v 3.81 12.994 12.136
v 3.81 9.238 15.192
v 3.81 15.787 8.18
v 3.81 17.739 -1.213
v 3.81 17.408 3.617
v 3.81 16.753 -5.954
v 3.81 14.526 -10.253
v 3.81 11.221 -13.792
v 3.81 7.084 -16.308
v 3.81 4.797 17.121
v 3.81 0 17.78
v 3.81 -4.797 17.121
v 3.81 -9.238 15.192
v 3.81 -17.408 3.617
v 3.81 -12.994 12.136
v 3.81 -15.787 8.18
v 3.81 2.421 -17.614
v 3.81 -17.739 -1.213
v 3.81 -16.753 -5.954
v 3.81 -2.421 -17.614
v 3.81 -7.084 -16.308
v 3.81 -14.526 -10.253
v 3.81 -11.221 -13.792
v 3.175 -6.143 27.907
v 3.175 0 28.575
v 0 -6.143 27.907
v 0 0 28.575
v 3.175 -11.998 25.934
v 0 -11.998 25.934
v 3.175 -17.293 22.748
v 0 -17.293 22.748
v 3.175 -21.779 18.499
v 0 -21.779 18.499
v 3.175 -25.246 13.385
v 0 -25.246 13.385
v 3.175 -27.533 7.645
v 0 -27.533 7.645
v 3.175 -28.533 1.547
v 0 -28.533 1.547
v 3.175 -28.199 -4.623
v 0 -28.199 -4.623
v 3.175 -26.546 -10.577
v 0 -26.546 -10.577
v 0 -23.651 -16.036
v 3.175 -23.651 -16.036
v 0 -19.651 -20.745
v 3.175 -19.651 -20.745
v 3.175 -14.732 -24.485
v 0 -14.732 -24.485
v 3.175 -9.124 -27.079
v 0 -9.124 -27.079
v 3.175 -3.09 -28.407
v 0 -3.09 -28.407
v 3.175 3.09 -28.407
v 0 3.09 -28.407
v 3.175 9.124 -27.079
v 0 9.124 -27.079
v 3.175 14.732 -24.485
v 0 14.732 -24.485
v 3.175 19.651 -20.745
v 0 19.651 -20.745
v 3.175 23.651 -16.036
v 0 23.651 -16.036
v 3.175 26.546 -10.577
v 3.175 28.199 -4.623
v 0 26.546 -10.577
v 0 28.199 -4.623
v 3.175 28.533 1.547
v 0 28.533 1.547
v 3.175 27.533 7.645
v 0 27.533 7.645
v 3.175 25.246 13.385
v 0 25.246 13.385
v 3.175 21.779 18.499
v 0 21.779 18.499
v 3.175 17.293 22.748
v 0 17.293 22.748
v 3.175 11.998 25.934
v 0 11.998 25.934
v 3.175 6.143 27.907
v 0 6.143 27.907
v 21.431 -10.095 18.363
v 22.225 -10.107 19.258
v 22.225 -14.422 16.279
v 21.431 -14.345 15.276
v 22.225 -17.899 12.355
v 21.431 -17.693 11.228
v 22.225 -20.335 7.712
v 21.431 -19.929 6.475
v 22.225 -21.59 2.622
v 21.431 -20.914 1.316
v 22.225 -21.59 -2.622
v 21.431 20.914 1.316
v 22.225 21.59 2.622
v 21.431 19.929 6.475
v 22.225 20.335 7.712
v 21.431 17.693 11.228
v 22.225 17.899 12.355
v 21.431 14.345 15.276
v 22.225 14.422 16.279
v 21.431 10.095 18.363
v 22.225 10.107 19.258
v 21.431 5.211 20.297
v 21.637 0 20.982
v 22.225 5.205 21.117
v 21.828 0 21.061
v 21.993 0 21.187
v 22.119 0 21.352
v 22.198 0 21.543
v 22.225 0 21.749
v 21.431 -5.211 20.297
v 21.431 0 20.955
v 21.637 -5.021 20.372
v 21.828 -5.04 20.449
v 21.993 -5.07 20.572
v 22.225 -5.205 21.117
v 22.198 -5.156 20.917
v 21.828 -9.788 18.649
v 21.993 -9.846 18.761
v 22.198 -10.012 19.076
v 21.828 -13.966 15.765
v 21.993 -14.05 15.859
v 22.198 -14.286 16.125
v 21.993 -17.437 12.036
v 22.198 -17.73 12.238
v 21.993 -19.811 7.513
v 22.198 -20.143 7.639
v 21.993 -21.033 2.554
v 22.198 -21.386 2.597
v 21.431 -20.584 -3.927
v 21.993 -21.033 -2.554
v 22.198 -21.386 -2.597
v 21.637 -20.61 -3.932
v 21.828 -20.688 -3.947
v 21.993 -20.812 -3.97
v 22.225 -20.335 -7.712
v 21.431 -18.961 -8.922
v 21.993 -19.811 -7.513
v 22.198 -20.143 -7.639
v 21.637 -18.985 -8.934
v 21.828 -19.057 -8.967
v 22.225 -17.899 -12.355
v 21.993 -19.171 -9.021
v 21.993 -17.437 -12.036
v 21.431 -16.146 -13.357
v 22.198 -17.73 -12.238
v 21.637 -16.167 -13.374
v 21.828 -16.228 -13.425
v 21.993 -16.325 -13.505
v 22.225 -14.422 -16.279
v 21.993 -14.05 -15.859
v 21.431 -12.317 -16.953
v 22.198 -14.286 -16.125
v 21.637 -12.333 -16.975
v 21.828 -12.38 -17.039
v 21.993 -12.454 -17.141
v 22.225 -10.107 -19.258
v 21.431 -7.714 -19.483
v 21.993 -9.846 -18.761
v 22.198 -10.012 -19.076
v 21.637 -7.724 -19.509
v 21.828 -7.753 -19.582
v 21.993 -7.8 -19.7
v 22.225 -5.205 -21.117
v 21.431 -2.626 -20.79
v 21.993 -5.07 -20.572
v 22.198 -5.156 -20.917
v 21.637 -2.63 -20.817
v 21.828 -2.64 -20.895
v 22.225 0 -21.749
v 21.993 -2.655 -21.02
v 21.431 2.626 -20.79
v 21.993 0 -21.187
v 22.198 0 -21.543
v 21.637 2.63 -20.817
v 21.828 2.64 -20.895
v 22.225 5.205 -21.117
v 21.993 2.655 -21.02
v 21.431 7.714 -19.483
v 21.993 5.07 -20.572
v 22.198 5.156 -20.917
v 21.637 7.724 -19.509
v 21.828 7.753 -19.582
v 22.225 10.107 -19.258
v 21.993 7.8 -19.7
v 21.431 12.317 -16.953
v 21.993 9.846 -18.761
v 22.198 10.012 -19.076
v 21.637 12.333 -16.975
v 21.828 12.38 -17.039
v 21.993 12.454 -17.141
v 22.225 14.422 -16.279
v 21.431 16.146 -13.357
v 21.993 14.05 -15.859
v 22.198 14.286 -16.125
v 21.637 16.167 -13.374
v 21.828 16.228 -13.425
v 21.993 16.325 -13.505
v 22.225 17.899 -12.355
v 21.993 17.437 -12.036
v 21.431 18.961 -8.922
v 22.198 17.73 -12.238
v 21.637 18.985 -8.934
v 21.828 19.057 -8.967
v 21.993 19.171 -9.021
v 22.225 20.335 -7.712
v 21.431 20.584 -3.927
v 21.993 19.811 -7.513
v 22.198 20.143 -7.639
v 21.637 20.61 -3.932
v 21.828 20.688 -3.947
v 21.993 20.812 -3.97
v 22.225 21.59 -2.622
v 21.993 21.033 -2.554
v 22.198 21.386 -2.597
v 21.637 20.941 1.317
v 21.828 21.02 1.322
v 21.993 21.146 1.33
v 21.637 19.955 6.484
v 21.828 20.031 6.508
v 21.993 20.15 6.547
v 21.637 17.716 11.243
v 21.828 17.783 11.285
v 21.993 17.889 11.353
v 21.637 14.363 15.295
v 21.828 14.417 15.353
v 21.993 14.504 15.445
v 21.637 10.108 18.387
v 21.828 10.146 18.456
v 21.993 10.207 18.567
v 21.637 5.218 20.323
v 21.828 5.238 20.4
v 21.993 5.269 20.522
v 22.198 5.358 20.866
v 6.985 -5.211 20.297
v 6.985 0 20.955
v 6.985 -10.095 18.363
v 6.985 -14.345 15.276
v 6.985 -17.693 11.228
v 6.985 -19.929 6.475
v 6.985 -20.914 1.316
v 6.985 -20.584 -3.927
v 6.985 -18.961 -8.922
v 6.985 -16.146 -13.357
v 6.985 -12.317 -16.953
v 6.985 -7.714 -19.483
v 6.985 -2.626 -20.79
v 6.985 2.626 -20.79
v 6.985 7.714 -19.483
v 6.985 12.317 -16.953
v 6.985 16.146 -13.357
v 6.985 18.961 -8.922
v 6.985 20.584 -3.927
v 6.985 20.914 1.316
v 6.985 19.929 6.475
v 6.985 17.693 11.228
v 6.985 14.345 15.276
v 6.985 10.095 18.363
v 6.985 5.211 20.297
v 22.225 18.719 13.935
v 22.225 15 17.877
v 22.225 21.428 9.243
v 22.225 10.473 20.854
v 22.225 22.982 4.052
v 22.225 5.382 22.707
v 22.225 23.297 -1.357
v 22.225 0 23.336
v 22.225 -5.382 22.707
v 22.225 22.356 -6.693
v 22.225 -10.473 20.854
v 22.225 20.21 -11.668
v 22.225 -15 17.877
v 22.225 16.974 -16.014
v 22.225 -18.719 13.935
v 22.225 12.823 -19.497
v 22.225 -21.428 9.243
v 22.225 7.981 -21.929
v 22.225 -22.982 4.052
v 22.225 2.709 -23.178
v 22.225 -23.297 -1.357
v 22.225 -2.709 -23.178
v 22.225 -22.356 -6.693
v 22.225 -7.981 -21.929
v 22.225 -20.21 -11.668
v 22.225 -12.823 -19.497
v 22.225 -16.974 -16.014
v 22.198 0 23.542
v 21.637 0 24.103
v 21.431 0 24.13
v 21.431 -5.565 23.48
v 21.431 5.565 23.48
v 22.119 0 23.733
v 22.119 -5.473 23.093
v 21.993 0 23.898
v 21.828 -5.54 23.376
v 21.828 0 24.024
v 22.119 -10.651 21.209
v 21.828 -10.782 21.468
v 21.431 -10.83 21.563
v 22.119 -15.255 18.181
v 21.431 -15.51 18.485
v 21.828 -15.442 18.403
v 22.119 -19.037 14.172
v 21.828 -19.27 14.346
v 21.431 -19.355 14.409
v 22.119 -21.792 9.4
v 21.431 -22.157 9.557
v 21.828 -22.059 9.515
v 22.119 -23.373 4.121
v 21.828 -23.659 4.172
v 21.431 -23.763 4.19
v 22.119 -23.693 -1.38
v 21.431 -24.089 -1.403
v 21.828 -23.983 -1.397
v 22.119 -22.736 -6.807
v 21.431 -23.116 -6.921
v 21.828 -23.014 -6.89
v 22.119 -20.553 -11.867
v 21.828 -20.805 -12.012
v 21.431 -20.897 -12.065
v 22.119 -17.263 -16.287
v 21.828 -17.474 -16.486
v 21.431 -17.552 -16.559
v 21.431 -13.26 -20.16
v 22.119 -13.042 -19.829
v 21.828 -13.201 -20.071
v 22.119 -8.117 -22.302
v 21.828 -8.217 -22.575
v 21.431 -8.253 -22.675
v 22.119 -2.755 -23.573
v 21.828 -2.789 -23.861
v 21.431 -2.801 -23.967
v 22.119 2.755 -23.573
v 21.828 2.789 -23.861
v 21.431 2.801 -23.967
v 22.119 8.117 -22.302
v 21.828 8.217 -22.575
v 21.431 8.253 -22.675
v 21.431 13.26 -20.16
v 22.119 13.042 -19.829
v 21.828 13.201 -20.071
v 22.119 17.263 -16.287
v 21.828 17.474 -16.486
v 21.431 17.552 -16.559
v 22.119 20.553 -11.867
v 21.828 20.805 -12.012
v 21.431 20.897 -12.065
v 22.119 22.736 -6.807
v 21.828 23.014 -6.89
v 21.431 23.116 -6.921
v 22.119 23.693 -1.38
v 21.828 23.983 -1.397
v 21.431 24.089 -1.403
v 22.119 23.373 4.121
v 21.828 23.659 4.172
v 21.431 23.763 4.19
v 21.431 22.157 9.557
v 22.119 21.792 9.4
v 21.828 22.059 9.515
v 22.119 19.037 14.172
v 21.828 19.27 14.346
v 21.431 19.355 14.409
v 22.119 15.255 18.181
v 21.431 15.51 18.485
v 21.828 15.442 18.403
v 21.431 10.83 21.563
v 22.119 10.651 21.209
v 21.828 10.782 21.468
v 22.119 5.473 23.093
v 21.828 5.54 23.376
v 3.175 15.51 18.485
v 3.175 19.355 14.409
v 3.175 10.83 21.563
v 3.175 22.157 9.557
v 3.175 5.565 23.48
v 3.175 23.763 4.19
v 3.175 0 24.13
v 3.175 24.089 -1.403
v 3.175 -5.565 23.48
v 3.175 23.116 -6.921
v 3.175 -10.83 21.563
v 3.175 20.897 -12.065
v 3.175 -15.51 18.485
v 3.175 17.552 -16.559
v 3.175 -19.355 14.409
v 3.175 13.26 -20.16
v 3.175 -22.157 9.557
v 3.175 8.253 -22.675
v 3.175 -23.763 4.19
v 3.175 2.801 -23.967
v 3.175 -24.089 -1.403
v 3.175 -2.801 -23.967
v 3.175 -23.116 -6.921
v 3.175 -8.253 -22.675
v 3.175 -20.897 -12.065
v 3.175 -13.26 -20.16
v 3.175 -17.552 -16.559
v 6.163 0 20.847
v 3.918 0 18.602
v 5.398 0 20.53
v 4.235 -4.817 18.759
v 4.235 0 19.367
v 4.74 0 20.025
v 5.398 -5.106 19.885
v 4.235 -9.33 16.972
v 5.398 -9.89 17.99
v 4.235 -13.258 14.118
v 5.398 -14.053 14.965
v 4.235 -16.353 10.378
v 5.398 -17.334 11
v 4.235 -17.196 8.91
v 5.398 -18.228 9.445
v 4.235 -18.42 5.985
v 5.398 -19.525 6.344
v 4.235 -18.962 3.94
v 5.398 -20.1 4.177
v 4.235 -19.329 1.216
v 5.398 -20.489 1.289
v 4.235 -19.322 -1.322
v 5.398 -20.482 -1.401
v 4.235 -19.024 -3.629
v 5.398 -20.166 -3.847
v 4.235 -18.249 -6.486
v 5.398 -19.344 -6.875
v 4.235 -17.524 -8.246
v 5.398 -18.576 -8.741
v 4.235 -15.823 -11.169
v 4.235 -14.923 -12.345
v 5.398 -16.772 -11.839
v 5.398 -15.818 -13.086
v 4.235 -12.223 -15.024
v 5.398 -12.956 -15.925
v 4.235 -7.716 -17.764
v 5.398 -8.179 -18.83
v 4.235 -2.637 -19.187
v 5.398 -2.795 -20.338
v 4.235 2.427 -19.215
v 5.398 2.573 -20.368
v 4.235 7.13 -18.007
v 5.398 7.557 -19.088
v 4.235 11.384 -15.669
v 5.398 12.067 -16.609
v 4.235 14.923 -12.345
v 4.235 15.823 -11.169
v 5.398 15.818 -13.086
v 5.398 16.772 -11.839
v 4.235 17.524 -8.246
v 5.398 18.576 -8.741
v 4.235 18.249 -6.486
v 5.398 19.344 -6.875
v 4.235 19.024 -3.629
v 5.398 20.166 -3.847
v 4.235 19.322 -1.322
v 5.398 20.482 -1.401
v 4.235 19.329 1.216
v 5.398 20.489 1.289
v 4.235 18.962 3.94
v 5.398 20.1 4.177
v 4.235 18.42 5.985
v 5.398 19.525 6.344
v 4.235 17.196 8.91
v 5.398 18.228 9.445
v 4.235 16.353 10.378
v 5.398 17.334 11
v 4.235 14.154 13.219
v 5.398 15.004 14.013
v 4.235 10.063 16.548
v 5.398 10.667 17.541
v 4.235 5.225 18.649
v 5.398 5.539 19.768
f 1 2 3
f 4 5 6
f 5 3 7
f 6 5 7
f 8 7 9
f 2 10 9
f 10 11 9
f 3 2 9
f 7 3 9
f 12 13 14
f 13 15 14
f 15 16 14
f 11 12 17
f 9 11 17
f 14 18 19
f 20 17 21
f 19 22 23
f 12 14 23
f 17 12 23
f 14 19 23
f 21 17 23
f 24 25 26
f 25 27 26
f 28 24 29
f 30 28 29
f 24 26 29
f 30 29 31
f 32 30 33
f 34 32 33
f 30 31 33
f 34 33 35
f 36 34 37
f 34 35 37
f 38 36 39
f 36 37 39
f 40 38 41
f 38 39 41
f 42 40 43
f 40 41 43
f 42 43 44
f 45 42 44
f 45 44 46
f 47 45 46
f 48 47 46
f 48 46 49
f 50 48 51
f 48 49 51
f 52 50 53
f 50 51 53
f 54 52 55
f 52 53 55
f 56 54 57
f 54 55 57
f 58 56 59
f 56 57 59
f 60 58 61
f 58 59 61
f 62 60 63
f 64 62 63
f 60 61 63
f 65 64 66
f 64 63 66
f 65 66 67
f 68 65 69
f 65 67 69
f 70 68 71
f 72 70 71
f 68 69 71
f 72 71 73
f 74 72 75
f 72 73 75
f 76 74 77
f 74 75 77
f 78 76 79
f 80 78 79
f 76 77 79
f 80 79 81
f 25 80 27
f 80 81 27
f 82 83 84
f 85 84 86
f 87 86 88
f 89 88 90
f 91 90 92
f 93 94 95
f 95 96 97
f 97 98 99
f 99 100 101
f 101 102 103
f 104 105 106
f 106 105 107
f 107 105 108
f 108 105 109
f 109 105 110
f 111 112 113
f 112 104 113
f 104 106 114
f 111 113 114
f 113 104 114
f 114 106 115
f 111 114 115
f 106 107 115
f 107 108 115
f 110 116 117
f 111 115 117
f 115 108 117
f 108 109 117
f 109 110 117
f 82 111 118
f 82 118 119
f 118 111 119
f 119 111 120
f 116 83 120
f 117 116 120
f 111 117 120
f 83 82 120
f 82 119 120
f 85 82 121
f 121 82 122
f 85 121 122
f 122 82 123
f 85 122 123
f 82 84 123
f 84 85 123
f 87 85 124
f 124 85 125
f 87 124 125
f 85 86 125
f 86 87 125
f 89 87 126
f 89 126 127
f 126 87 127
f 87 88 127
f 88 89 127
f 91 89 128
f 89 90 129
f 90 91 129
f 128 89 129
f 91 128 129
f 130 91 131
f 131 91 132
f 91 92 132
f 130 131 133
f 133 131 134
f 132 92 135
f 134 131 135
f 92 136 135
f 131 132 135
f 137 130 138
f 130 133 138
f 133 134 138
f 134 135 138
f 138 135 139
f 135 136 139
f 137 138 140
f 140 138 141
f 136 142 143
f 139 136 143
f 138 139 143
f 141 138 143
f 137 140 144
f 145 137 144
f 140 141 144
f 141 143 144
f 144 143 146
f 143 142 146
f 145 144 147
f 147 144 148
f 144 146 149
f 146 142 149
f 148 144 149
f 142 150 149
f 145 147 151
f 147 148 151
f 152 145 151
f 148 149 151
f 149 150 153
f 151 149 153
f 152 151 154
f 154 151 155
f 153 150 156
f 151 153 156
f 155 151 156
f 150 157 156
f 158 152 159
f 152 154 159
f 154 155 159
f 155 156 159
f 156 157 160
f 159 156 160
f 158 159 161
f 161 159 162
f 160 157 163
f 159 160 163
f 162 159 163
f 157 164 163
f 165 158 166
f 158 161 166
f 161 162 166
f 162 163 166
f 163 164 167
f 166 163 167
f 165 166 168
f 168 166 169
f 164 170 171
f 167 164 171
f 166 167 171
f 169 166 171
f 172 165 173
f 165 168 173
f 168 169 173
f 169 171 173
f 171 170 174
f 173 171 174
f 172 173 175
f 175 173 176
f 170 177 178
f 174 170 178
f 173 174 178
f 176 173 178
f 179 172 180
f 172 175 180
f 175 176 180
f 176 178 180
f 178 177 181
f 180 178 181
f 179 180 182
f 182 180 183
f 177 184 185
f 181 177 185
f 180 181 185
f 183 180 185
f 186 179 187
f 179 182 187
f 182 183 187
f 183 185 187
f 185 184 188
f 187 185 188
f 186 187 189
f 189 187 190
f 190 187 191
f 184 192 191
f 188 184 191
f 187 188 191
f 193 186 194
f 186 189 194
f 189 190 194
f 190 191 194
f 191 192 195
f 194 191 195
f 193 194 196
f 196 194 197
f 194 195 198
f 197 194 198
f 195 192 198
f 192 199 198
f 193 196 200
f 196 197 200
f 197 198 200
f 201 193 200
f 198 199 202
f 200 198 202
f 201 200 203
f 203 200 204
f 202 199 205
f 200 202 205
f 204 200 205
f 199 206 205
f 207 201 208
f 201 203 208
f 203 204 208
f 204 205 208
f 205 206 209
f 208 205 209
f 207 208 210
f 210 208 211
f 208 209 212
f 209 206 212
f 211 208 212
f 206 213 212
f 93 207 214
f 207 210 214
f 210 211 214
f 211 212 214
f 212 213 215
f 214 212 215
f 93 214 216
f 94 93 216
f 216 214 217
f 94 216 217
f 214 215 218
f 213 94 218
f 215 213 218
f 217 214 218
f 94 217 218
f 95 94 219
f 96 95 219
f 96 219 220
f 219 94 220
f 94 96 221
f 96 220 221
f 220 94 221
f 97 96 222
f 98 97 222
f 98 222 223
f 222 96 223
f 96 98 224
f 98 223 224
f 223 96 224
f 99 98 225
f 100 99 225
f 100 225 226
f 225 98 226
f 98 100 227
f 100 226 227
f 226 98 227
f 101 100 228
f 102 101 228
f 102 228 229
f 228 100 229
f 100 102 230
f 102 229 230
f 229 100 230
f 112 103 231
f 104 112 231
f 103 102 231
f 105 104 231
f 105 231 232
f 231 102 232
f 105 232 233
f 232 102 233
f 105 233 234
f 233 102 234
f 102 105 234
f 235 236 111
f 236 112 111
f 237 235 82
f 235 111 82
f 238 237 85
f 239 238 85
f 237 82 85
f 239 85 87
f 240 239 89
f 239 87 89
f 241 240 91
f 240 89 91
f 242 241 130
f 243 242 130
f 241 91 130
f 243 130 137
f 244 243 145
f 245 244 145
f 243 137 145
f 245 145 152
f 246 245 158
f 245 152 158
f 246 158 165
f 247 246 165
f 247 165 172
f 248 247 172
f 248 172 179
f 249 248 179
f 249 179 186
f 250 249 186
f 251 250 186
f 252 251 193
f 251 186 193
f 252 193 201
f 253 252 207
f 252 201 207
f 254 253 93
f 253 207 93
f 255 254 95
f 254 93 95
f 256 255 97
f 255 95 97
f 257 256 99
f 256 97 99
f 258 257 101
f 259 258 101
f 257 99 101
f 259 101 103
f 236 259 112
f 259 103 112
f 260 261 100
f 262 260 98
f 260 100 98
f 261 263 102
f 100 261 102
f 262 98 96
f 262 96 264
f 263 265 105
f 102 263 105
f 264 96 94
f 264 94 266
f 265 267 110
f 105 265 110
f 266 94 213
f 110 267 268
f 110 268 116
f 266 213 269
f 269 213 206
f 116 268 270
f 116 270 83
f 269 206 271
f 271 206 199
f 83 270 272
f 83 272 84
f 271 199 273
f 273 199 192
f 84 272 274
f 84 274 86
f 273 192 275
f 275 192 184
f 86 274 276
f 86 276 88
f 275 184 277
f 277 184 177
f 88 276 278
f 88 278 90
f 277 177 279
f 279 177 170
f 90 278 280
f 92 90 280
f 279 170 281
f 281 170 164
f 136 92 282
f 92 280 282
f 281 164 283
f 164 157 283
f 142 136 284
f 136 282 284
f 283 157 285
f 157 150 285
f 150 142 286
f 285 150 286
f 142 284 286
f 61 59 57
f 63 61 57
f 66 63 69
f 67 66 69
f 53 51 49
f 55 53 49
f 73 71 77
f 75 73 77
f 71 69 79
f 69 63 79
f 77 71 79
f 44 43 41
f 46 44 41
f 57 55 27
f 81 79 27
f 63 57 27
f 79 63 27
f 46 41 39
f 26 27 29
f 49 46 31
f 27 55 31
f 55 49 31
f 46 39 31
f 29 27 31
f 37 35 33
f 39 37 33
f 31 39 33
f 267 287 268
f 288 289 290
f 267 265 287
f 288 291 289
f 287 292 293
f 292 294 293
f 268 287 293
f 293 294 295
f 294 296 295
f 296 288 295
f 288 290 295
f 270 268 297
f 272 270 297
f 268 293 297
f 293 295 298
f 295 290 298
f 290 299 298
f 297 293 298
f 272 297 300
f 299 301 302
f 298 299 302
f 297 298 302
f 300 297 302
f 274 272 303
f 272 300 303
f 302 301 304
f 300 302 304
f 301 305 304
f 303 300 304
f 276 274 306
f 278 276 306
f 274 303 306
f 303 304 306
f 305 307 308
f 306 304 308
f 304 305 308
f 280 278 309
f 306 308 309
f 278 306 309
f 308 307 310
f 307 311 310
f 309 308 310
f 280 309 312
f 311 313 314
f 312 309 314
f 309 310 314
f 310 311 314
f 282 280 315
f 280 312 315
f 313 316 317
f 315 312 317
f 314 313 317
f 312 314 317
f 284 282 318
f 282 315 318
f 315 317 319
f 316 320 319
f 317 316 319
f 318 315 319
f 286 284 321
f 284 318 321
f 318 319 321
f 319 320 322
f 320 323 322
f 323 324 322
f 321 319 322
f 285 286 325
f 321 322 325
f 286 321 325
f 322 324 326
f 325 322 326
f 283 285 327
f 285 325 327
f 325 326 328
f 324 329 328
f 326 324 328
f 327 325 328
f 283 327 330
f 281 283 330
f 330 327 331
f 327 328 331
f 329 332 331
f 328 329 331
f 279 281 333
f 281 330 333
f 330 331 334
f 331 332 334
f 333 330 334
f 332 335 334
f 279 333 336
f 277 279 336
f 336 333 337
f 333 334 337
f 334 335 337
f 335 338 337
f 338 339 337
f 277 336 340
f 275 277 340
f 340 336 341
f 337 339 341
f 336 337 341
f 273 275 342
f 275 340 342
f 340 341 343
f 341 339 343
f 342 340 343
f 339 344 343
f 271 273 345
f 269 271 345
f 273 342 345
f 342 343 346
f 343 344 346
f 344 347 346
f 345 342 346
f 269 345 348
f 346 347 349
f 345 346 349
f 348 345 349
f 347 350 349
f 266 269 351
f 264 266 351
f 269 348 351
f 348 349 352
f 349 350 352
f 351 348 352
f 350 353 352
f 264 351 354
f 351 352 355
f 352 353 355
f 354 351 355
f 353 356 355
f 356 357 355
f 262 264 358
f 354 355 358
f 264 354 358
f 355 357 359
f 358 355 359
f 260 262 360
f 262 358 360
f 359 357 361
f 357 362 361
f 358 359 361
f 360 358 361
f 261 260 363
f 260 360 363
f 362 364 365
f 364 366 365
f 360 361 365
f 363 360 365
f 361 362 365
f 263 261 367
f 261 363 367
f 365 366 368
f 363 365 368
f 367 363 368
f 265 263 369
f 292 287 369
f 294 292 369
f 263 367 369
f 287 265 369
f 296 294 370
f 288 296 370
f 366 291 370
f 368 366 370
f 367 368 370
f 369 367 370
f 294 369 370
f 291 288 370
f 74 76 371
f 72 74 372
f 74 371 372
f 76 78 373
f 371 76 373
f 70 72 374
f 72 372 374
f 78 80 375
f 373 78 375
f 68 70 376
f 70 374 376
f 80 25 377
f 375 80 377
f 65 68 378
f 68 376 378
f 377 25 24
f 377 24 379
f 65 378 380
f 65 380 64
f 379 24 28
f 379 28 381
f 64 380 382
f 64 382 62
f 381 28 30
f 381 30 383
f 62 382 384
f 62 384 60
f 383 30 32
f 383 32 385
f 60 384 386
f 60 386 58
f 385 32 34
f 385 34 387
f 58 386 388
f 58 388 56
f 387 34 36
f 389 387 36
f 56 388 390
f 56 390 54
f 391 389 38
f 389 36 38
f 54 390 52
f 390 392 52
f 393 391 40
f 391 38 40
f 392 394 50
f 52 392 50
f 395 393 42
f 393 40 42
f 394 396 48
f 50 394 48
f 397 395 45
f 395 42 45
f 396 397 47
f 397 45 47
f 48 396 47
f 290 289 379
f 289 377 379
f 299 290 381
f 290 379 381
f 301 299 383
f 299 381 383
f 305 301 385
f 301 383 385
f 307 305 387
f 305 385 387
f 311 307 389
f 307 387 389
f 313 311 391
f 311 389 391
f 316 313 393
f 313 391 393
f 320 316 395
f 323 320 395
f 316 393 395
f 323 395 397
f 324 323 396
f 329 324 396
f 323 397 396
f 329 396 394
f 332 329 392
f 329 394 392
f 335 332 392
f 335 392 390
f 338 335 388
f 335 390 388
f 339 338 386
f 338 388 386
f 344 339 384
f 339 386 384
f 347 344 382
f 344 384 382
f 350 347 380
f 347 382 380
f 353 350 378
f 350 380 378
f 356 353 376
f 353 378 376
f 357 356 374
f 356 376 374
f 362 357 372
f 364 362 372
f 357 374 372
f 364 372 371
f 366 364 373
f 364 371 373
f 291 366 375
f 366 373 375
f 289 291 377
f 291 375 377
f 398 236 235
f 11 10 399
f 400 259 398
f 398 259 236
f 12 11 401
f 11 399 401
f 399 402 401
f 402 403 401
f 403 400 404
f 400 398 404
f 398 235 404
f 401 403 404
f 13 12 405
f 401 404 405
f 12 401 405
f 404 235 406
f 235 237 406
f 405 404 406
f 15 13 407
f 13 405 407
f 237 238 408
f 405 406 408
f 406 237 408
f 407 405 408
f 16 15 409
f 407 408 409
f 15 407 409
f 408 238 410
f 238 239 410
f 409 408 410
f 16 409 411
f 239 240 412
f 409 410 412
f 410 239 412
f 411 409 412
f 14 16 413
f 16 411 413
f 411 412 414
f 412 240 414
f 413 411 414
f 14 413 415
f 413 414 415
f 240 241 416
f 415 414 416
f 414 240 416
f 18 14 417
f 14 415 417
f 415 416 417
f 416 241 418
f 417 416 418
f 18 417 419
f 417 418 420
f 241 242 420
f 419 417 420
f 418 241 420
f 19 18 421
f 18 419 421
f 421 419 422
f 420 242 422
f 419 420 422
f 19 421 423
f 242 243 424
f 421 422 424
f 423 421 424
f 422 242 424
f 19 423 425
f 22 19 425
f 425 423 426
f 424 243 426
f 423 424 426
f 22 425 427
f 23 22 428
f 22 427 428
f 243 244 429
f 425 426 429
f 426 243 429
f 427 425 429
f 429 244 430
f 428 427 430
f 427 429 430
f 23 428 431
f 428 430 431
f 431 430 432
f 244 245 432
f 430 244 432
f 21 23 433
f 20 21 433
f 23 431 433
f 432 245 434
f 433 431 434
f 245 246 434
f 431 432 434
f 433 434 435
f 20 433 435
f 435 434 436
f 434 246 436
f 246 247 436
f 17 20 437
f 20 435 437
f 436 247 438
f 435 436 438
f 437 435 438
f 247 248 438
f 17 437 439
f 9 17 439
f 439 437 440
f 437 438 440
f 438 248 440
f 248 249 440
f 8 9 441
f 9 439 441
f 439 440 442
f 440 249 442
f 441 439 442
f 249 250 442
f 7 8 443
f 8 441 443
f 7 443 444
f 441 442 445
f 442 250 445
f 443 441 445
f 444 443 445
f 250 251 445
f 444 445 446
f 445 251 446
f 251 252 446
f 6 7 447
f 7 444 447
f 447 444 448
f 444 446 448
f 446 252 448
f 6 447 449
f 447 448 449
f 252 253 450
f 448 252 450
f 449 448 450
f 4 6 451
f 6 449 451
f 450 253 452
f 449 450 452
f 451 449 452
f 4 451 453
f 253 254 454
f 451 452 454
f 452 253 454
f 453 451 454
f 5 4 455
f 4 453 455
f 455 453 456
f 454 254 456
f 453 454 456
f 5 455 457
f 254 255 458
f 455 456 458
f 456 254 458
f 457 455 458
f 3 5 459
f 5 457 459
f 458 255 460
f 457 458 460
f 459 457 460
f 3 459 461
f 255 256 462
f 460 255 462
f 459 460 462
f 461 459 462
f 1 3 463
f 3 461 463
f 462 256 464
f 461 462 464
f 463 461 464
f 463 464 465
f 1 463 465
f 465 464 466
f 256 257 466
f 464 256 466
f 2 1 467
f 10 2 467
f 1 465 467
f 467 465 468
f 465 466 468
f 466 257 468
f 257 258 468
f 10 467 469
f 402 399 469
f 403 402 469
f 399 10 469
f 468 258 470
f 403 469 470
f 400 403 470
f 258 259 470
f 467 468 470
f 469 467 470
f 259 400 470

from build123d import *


with BuildPart() as f1:
    # F0 (on Front) → F1 (revolve)
    with BuildSketch(Plane.XZ):
        with BuildLine():
            Line((0, 28.575), (0, 0))
            Line((0, 0), (3.81, 0))
            Line((3.81, 0), (3.81, 17.78))
            ThreePointArc((3.81, 17.78), (4.739936, 20.025064), (6.985, 20.955))
            Line((6.985, 20.955), (21.43125, 20.955))
            ThreePointArc((21.43125, 20.955), (21.992516, 21.187484), (22.225, 21.74875))
            Line((22.225, 21.74875), (22.225, 23.33625))
            ThreePointArc((22.225, 23.33625), (21.992516, 23.897516), (21.43125, 24.13))
            Line((21.43125, 24.13), (3.175, 24.13))
            Line((3.175, 24.13), (3.175, 28.575))
            Line((3.175, 28.575), (0.79375, 28.575))
            Line((0.79375, 28.575), (0, 28.575))
        make_face()
    revolve(axis=Axis((1.905, 0, 0), (1, 0, 0)))


solid = f1.part
